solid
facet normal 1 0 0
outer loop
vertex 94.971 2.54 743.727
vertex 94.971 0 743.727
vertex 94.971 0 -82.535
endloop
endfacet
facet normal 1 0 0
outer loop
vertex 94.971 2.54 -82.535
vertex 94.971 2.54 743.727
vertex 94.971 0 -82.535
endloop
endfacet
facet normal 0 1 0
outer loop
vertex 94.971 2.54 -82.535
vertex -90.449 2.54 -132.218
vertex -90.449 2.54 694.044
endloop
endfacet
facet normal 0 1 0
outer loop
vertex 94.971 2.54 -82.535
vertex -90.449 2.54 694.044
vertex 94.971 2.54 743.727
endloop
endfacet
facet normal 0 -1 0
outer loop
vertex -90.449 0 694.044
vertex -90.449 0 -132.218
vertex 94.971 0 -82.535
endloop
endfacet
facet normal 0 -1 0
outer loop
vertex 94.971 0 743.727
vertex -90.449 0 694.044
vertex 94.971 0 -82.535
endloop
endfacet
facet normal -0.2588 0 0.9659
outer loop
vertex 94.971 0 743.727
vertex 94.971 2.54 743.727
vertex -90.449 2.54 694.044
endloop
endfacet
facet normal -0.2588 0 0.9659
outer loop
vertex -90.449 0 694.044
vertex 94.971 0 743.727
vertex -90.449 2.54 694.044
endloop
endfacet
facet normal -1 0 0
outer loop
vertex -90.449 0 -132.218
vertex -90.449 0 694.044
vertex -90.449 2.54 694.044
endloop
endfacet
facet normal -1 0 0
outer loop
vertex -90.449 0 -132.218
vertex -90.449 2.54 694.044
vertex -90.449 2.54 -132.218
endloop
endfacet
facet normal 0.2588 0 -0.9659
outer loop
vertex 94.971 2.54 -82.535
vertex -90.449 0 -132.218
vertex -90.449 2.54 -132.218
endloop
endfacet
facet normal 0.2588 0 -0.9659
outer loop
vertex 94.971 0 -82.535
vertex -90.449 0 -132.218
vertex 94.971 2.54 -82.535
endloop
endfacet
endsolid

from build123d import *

# Parameters (mm, degrees)
SKETCH1_W           = 185.42
SKETCH1_H           = 826.262
BOSS_EXTRUDE1_DEPTH = 2.54
CUT_EXTRUDE1_DEPTH  = 2.54
BOSS_EXTRUDE3_DEPTH = 2.54


with BuildPart() as part:
    # Sketch1 → Boss-Extrude1 (new body)
    with BuildSketch(Plane(origin=(0, 0, 0), x_dir=(1, 0, 0), z_dir=(0, 1, 0))):
        with Locations((2.261219512, -330.596487805)):
            Rectangle(SKETCH1_W, SKETCH1_H)
    extrude(amount=BOSS_EXTRUDE1_DEPTH)

    # Sketch2 → Cut-Extrude1 (cut)
    with BuildSketch(Plane(origin=(0, 2.54, 0), x_dir=(1, 0, 0), z_dir=(0, 1, 0))):
        Polygon((94.971219512, -743.727487805), (-90.448780488, -694.044348544), (-90.448780488, -743.727487805), align=None)
    extrude(amount=-CUT_EXTRUDE1_DEPTH, mode=Mode.SUBTRACT)

    # Sketch3 → Boss-Extrude3 (add)
    with BuildSketch(Plane.XZ):
        Polygon((-90.448780488, -82.534512195), (-90.448780488, -132.217651456), (94.971219512, -82.534512195), align=None)
    extrude(amount=-BOSS_EXTRUDE3_DEPTH)


solid = part.part
